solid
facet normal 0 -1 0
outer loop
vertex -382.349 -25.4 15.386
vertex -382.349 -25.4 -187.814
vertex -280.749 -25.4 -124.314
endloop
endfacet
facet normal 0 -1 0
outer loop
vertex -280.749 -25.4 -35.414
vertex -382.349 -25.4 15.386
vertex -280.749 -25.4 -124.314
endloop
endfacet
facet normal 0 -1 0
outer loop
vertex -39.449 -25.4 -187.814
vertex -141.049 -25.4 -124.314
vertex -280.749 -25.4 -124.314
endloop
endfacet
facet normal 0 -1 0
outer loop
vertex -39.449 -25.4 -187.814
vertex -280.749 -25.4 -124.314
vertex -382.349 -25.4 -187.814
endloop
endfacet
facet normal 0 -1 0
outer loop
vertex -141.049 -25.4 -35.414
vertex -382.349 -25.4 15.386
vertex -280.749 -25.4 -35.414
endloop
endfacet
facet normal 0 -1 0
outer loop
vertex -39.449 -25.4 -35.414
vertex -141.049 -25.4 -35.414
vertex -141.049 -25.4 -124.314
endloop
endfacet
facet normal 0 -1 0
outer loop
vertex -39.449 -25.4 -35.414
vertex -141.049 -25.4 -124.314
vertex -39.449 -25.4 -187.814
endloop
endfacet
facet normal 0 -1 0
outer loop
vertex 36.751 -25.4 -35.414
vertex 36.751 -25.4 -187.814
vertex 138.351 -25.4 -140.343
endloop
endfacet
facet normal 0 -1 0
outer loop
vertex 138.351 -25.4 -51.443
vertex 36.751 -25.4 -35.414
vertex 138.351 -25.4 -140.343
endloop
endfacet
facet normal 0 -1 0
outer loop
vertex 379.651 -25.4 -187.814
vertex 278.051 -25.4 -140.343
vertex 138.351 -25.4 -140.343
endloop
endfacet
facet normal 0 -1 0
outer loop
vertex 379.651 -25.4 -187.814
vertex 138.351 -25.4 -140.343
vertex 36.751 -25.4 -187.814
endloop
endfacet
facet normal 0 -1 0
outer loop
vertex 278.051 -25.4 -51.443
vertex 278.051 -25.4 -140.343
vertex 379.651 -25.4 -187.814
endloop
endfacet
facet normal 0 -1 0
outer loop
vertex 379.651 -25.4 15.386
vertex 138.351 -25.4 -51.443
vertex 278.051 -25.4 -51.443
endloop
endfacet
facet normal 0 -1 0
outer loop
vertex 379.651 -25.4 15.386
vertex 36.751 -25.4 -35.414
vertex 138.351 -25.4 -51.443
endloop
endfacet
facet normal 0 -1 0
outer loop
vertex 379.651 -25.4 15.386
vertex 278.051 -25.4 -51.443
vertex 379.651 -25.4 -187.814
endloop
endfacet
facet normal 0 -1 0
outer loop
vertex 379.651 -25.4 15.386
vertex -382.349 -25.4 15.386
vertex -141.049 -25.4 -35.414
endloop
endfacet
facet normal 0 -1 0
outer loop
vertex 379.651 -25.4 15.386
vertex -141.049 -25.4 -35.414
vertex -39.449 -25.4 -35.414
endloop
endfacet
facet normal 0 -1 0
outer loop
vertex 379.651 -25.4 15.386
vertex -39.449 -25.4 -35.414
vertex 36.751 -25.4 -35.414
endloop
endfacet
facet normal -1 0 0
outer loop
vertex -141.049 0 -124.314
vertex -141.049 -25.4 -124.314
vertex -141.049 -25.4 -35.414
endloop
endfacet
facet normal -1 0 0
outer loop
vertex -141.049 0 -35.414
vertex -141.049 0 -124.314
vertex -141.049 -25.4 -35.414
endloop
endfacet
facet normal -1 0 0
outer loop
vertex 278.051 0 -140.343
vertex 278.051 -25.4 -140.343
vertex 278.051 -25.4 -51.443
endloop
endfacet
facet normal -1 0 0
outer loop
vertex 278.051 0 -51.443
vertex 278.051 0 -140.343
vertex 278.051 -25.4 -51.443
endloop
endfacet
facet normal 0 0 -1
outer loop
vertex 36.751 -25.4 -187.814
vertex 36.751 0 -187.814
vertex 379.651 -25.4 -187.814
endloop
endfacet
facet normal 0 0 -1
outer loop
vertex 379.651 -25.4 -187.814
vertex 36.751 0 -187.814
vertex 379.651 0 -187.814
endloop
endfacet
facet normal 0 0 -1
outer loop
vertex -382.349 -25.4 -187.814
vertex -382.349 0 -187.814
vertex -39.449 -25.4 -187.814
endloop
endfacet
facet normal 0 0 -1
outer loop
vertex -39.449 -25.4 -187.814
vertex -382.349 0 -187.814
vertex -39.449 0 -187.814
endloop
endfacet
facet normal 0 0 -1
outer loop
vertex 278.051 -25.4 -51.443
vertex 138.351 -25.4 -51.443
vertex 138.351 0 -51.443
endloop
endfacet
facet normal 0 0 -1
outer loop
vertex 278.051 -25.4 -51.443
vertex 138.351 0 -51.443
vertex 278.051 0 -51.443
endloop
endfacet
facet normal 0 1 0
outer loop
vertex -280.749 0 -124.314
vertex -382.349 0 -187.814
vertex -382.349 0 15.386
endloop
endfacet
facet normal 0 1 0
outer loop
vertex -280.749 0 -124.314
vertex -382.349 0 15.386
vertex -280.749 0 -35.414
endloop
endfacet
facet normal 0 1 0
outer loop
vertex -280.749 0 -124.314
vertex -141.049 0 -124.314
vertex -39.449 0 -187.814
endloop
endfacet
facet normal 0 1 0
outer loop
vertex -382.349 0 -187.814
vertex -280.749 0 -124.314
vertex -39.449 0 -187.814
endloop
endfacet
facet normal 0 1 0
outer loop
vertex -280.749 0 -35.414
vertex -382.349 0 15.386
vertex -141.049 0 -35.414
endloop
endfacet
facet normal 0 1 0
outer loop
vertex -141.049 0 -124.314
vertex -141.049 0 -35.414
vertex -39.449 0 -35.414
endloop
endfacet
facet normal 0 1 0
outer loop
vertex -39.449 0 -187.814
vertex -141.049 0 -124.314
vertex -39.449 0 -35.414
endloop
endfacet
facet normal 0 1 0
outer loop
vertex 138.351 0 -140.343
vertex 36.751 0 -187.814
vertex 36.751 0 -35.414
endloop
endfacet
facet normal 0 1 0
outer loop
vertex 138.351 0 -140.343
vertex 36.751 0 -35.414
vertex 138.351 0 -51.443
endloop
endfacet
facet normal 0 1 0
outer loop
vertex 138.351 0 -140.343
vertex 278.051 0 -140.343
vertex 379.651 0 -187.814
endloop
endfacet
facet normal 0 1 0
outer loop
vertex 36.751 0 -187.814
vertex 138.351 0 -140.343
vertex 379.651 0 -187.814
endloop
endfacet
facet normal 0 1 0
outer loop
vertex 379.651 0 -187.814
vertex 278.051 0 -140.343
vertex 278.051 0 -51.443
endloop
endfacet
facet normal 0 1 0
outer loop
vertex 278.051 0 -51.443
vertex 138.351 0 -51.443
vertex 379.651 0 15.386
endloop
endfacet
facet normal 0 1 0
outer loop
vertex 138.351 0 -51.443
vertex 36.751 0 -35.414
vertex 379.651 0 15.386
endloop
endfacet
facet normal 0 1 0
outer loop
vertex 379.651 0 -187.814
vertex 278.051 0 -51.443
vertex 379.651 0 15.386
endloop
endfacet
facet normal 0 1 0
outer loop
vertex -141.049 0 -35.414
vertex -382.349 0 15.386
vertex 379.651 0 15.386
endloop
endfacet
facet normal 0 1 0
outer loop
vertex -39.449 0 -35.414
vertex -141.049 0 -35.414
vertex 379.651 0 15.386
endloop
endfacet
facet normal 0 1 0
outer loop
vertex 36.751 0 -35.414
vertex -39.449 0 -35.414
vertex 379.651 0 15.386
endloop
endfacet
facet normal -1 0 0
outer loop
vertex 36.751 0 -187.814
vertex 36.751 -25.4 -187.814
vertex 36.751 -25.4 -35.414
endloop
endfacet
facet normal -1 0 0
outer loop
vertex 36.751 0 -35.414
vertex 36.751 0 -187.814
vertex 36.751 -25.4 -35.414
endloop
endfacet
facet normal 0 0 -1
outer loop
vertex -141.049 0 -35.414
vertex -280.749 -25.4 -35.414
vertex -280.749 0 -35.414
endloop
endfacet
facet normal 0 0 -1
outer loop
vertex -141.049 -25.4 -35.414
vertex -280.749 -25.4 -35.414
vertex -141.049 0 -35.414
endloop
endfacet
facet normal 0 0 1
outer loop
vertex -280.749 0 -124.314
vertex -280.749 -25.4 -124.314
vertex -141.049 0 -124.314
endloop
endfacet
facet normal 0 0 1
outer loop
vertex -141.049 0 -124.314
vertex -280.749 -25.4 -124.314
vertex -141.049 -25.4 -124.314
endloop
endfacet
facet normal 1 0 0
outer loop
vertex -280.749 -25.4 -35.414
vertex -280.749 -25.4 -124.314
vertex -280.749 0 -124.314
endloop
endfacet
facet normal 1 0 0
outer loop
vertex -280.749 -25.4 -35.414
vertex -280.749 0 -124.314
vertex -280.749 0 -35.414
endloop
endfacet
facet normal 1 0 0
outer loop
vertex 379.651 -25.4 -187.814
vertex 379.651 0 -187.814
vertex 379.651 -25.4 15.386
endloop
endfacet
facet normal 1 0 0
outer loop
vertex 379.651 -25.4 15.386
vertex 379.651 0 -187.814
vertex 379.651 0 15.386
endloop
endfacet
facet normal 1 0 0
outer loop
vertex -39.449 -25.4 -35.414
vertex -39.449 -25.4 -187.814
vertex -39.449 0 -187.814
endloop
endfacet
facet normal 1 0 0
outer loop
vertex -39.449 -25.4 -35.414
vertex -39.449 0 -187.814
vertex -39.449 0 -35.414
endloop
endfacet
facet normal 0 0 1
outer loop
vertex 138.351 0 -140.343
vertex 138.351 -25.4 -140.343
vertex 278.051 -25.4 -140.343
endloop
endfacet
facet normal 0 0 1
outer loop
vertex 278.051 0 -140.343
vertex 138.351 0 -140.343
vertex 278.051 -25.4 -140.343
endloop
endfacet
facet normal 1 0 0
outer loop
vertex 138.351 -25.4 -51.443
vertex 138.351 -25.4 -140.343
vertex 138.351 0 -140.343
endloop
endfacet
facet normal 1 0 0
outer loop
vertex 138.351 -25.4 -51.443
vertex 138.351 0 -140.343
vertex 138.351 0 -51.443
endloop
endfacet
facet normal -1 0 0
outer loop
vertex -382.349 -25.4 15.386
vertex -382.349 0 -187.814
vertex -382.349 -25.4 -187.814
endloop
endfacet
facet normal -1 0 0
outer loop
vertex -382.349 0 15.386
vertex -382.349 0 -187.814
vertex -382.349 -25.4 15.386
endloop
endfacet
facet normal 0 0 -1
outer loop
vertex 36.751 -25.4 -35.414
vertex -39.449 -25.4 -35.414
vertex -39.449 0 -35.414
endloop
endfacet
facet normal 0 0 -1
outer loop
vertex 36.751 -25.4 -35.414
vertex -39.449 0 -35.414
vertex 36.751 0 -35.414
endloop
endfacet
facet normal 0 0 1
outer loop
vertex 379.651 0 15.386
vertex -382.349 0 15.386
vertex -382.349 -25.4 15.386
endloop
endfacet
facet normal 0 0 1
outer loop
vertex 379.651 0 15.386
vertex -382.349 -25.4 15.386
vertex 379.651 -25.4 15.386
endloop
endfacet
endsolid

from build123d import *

# Parameters (mm, degrees)
F0_W     = 762
F0_H     = 203.2
F1_DEPTH = 25.4
F2_W     = 139.7
F2_H     = 88.9
F3_DEPTH = 50.8
F2_W_2   = 76.2
F2_H_2   = 152.4
F4_DEPTH = 50.8
F5_DEPTH = 50.8


with BuildPart() as f1:
    # F0 (on Front) → F1 (new body)
    with BuildSketch(Plane.XZ):
        with Locations((-1.348659, -86.213874)):
            Rectangle(F0_W, F0_H)
    extrude(amount=F1_DEPTH)

    # F2 (on face) → F3 (cut)
    with BuildSketch(Plane.XZ.offset(25.4)):
        with Locations((-210.898659, -79.863874)):
            Rectangle(F2_W, F2_H)
    extrude(amount=-F3_DEPTH, mode=Mode.SUBTRACT)

    # F2 (on face) → F4 (cut)
    with BuildSketch(Plane.XZ.offset(25.4)):
        with Locations((-1.348659, -111.613874)):
            Rectangle(F2_W_2, F2_H_2)
    extrude(amount=-F4_DEPTH, mode=Mode.SUBTRACT)

    # F2 (on face) → F5 (cut)
    with BuildSketch(Plane.XZ.offset(25.4)):
        with Locations((208.201341, -95.893279)):
            Rectangle(F2_W, F2_H)
    extrude(amount=-F5_DEPTH, mode=Mode.SUBTRACT)


solid = f1.part
